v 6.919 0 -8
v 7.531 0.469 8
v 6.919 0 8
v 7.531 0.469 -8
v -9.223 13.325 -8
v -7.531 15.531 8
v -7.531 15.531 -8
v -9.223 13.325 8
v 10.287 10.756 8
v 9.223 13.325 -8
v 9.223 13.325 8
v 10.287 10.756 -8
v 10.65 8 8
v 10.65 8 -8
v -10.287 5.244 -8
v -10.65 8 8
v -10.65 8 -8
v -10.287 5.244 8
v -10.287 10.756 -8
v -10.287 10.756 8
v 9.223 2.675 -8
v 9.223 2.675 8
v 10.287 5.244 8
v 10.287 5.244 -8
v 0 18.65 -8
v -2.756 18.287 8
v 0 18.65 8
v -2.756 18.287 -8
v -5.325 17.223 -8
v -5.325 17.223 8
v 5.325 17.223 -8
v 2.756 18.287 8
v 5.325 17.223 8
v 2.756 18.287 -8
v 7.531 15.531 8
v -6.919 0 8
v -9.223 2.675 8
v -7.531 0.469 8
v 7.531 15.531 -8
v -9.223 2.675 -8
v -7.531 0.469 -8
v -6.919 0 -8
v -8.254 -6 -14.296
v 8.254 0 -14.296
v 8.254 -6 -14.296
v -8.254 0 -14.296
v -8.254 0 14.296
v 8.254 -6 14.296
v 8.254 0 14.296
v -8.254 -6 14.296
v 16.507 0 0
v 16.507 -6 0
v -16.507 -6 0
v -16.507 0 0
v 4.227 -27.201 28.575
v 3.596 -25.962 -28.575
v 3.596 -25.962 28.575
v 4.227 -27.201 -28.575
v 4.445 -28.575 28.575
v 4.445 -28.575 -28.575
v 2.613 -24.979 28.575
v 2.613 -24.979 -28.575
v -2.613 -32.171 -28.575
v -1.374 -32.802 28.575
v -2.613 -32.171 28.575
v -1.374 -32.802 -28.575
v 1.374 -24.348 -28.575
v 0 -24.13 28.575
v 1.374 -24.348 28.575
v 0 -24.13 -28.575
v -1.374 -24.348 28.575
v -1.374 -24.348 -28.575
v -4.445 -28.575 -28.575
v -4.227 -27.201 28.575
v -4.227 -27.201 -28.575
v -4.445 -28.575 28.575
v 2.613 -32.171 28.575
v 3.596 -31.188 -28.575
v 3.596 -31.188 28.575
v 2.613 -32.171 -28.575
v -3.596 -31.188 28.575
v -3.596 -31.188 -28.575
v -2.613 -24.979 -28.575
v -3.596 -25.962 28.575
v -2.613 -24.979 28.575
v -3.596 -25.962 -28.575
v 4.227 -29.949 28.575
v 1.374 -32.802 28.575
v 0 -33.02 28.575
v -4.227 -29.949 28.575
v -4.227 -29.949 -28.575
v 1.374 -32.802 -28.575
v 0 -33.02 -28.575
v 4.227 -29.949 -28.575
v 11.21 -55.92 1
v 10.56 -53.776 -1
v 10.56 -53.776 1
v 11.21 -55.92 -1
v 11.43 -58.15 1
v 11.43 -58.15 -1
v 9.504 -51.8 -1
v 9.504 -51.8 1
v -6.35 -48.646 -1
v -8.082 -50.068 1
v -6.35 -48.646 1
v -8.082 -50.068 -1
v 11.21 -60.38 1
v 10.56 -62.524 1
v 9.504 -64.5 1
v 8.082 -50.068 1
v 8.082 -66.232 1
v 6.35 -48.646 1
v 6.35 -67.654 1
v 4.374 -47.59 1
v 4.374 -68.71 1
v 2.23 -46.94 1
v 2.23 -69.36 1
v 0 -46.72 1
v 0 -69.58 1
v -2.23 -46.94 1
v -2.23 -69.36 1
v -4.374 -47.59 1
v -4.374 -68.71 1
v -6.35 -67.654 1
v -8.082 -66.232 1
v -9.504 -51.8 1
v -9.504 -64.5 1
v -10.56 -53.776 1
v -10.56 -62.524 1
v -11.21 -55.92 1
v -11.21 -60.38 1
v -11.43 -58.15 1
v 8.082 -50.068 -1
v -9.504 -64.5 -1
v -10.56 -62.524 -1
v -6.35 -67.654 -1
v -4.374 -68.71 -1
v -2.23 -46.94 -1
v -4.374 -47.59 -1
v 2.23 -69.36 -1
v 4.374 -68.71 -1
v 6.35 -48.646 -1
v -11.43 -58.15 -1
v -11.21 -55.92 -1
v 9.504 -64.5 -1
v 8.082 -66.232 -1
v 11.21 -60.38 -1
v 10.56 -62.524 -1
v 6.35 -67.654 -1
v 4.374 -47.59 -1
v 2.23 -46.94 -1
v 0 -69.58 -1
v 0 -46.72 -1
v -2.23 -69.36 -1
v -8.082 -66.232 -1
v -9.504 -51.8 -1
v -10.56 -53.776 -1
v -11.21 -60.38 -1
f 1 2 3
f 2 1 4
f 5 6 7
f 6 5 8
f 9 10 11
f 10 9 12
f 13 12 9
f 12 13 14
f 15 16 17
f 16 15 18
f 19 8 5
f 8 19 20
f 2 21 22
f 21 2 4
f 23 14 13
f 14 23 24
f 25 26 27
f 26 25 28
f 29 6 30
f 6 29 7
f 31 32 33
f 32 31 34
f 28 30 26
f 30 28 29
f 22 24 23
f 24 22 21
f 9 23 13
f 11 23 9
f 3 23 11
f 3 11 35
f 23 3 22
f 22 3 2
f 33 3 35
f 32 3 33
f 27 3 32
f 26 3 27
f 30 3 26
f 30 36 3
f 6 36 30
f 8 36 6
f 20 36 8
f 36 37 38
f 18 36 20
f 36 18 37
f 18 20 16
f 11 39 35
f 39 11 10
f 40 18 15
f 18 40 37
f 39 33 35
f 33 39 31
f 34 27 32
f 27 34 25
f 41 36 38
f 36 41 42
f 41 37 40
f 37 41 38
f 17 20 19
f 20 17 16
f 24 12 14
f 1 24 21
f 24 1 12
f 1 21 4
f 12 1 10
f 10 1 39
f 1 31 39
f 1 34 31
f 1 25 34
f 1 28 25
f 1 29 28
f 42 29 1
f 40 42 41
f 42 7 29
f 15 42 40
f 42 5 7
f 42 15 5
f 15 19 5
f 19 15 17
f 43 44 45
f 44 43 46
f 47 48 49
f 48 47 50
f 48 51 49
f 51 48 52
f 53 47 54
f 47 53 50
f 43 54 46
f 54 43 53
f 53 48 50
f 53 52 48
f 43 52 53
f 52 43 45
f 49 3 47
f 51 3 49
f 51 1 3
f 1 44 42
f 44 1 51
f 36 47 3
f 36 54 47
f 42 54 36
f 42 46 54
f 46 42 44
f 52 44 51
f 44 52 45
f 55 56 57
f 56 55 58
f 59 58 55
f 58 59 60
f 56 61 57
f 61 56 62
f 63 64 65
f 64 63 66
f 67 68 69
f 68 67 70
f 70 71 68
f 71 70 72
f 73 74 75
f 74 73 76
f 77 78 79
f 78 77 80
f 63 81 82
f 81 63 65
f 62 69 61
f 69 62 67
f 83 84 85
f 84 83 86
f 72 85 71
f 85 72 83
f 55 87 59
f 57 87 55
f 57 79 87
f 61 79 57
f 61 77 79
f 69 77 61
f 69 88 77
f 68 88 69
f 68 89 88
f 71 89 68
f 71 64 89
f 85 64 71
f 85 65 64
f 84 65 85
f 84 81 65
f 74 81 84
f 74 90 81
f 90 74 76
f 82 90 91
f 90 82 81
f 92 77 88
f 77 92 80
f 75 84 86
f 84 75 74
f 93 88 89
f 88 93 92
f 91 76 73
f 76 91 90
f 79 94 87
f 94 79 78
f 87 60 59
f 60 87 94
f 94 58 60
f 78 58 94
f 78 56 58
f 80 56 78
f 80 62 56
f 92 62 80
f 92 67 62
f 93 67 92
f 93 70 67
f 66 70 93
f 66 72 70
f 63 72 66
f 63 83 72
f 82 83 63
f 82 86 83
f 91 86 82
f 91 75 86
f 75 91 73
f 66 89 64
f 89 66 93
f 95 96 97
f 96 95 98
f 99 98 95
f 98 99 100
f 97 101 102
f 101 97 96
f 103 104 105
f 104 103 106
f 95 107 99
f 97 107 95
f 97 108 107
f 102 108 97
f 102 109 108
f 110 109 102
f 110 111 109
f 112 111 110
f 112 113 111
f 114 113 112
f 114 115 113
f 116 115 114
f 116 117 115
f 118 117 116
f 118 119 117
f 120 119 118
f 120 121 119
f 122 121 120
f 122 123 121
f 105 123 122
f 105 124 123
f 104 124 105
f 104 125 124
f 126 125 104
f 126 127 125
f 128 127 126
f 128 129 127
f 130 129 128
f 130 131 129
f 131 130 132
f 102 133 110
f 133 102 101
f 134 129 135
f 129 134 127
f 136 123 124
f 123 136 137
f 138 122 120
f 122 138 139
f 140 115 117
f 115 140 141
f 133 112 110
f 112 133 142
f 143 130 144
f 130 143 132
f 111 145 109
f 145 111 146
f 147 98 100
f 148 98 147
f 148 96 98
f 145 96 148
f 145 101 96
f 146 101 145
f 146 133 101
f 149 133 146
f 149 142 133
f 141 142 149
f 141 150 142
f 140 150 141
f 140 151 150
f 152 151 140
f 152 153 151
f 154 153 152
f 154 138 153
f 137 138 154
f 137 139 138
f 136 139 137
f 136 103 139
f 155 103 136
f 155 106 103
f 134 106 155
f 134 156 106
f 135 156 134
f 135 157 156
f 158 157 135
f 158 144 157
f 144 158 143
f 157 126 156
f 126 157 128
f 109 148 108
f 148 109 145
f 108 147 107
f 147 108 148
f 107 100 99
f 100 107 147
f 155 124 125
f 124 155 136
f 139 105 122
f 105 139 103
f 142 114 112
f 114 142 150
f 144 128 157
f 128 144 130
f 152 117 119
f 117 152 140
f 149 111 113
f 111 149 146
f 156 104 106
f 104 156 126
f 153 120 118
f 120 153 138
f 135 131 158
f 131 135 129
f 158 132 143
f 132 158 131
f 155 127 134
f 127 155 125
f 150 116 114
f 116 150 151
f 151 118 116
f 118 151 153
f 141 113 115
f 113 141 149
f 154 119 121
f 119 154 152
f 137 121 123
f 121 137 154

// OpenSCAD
// Auto-generated by scripts/author_from_manifest.py (Phase D.3).
// Source: data/phase_d_manifest.json (sku_intent='viking-vk200-pendent-175f').
// Do not hand-edit — regenerate from the manifest.
//
// @part viking_vk200_pendent_175f
// @kind sprinkler_head
// @category head.pendant.k56
// @display-name "Viking VK200 Pendent K5.6 SR 175°F"
// @mfg viking_group
// @mfg-pn VK200
// @listing UL FM
// @hazard-classes LH OH1
// @price-usd 13.10
// @install-minutes 8
// @crew journeyman
// @k-factor 5.6
// @orientation pendant
// @response standard
// @temperature 175F
// @param size_in number default=0.5 label="Size" unit="in"
// @port inlet position=[0,0.014,0] direction=[0,1,0] style=NPT_threaded size_in=0.5 role=drop

size_in = 0.5;
k_factor = 5.6;

length_mm   = 57.15;
body_dia_mm = 25.40;
thread_od   = 21.3;
thread_len  = 16;
deflector_d = body_dia_mm * 0.9;

 union() {
    translate([0, thread_len/2, 0])
        cylinder(h = thread_len, d = thread_od, center = true, $fn = 24);
    translate([0, -3, 0])
        rotate([90, 0, 0])
        cylinder(h = 6, d = thread_od * 1.55, $fn = 6, center = true);
    translate([0, -length_mm/2, 0])
        cylinder(h = length_mm, d = body_dia_mm * 0.35, center = true, $fn = 20);
    translate([0, -length_mm - 1, 0])
        cylinder(h = 2, d = deflector_d, center = true, $fn = 32);
}
